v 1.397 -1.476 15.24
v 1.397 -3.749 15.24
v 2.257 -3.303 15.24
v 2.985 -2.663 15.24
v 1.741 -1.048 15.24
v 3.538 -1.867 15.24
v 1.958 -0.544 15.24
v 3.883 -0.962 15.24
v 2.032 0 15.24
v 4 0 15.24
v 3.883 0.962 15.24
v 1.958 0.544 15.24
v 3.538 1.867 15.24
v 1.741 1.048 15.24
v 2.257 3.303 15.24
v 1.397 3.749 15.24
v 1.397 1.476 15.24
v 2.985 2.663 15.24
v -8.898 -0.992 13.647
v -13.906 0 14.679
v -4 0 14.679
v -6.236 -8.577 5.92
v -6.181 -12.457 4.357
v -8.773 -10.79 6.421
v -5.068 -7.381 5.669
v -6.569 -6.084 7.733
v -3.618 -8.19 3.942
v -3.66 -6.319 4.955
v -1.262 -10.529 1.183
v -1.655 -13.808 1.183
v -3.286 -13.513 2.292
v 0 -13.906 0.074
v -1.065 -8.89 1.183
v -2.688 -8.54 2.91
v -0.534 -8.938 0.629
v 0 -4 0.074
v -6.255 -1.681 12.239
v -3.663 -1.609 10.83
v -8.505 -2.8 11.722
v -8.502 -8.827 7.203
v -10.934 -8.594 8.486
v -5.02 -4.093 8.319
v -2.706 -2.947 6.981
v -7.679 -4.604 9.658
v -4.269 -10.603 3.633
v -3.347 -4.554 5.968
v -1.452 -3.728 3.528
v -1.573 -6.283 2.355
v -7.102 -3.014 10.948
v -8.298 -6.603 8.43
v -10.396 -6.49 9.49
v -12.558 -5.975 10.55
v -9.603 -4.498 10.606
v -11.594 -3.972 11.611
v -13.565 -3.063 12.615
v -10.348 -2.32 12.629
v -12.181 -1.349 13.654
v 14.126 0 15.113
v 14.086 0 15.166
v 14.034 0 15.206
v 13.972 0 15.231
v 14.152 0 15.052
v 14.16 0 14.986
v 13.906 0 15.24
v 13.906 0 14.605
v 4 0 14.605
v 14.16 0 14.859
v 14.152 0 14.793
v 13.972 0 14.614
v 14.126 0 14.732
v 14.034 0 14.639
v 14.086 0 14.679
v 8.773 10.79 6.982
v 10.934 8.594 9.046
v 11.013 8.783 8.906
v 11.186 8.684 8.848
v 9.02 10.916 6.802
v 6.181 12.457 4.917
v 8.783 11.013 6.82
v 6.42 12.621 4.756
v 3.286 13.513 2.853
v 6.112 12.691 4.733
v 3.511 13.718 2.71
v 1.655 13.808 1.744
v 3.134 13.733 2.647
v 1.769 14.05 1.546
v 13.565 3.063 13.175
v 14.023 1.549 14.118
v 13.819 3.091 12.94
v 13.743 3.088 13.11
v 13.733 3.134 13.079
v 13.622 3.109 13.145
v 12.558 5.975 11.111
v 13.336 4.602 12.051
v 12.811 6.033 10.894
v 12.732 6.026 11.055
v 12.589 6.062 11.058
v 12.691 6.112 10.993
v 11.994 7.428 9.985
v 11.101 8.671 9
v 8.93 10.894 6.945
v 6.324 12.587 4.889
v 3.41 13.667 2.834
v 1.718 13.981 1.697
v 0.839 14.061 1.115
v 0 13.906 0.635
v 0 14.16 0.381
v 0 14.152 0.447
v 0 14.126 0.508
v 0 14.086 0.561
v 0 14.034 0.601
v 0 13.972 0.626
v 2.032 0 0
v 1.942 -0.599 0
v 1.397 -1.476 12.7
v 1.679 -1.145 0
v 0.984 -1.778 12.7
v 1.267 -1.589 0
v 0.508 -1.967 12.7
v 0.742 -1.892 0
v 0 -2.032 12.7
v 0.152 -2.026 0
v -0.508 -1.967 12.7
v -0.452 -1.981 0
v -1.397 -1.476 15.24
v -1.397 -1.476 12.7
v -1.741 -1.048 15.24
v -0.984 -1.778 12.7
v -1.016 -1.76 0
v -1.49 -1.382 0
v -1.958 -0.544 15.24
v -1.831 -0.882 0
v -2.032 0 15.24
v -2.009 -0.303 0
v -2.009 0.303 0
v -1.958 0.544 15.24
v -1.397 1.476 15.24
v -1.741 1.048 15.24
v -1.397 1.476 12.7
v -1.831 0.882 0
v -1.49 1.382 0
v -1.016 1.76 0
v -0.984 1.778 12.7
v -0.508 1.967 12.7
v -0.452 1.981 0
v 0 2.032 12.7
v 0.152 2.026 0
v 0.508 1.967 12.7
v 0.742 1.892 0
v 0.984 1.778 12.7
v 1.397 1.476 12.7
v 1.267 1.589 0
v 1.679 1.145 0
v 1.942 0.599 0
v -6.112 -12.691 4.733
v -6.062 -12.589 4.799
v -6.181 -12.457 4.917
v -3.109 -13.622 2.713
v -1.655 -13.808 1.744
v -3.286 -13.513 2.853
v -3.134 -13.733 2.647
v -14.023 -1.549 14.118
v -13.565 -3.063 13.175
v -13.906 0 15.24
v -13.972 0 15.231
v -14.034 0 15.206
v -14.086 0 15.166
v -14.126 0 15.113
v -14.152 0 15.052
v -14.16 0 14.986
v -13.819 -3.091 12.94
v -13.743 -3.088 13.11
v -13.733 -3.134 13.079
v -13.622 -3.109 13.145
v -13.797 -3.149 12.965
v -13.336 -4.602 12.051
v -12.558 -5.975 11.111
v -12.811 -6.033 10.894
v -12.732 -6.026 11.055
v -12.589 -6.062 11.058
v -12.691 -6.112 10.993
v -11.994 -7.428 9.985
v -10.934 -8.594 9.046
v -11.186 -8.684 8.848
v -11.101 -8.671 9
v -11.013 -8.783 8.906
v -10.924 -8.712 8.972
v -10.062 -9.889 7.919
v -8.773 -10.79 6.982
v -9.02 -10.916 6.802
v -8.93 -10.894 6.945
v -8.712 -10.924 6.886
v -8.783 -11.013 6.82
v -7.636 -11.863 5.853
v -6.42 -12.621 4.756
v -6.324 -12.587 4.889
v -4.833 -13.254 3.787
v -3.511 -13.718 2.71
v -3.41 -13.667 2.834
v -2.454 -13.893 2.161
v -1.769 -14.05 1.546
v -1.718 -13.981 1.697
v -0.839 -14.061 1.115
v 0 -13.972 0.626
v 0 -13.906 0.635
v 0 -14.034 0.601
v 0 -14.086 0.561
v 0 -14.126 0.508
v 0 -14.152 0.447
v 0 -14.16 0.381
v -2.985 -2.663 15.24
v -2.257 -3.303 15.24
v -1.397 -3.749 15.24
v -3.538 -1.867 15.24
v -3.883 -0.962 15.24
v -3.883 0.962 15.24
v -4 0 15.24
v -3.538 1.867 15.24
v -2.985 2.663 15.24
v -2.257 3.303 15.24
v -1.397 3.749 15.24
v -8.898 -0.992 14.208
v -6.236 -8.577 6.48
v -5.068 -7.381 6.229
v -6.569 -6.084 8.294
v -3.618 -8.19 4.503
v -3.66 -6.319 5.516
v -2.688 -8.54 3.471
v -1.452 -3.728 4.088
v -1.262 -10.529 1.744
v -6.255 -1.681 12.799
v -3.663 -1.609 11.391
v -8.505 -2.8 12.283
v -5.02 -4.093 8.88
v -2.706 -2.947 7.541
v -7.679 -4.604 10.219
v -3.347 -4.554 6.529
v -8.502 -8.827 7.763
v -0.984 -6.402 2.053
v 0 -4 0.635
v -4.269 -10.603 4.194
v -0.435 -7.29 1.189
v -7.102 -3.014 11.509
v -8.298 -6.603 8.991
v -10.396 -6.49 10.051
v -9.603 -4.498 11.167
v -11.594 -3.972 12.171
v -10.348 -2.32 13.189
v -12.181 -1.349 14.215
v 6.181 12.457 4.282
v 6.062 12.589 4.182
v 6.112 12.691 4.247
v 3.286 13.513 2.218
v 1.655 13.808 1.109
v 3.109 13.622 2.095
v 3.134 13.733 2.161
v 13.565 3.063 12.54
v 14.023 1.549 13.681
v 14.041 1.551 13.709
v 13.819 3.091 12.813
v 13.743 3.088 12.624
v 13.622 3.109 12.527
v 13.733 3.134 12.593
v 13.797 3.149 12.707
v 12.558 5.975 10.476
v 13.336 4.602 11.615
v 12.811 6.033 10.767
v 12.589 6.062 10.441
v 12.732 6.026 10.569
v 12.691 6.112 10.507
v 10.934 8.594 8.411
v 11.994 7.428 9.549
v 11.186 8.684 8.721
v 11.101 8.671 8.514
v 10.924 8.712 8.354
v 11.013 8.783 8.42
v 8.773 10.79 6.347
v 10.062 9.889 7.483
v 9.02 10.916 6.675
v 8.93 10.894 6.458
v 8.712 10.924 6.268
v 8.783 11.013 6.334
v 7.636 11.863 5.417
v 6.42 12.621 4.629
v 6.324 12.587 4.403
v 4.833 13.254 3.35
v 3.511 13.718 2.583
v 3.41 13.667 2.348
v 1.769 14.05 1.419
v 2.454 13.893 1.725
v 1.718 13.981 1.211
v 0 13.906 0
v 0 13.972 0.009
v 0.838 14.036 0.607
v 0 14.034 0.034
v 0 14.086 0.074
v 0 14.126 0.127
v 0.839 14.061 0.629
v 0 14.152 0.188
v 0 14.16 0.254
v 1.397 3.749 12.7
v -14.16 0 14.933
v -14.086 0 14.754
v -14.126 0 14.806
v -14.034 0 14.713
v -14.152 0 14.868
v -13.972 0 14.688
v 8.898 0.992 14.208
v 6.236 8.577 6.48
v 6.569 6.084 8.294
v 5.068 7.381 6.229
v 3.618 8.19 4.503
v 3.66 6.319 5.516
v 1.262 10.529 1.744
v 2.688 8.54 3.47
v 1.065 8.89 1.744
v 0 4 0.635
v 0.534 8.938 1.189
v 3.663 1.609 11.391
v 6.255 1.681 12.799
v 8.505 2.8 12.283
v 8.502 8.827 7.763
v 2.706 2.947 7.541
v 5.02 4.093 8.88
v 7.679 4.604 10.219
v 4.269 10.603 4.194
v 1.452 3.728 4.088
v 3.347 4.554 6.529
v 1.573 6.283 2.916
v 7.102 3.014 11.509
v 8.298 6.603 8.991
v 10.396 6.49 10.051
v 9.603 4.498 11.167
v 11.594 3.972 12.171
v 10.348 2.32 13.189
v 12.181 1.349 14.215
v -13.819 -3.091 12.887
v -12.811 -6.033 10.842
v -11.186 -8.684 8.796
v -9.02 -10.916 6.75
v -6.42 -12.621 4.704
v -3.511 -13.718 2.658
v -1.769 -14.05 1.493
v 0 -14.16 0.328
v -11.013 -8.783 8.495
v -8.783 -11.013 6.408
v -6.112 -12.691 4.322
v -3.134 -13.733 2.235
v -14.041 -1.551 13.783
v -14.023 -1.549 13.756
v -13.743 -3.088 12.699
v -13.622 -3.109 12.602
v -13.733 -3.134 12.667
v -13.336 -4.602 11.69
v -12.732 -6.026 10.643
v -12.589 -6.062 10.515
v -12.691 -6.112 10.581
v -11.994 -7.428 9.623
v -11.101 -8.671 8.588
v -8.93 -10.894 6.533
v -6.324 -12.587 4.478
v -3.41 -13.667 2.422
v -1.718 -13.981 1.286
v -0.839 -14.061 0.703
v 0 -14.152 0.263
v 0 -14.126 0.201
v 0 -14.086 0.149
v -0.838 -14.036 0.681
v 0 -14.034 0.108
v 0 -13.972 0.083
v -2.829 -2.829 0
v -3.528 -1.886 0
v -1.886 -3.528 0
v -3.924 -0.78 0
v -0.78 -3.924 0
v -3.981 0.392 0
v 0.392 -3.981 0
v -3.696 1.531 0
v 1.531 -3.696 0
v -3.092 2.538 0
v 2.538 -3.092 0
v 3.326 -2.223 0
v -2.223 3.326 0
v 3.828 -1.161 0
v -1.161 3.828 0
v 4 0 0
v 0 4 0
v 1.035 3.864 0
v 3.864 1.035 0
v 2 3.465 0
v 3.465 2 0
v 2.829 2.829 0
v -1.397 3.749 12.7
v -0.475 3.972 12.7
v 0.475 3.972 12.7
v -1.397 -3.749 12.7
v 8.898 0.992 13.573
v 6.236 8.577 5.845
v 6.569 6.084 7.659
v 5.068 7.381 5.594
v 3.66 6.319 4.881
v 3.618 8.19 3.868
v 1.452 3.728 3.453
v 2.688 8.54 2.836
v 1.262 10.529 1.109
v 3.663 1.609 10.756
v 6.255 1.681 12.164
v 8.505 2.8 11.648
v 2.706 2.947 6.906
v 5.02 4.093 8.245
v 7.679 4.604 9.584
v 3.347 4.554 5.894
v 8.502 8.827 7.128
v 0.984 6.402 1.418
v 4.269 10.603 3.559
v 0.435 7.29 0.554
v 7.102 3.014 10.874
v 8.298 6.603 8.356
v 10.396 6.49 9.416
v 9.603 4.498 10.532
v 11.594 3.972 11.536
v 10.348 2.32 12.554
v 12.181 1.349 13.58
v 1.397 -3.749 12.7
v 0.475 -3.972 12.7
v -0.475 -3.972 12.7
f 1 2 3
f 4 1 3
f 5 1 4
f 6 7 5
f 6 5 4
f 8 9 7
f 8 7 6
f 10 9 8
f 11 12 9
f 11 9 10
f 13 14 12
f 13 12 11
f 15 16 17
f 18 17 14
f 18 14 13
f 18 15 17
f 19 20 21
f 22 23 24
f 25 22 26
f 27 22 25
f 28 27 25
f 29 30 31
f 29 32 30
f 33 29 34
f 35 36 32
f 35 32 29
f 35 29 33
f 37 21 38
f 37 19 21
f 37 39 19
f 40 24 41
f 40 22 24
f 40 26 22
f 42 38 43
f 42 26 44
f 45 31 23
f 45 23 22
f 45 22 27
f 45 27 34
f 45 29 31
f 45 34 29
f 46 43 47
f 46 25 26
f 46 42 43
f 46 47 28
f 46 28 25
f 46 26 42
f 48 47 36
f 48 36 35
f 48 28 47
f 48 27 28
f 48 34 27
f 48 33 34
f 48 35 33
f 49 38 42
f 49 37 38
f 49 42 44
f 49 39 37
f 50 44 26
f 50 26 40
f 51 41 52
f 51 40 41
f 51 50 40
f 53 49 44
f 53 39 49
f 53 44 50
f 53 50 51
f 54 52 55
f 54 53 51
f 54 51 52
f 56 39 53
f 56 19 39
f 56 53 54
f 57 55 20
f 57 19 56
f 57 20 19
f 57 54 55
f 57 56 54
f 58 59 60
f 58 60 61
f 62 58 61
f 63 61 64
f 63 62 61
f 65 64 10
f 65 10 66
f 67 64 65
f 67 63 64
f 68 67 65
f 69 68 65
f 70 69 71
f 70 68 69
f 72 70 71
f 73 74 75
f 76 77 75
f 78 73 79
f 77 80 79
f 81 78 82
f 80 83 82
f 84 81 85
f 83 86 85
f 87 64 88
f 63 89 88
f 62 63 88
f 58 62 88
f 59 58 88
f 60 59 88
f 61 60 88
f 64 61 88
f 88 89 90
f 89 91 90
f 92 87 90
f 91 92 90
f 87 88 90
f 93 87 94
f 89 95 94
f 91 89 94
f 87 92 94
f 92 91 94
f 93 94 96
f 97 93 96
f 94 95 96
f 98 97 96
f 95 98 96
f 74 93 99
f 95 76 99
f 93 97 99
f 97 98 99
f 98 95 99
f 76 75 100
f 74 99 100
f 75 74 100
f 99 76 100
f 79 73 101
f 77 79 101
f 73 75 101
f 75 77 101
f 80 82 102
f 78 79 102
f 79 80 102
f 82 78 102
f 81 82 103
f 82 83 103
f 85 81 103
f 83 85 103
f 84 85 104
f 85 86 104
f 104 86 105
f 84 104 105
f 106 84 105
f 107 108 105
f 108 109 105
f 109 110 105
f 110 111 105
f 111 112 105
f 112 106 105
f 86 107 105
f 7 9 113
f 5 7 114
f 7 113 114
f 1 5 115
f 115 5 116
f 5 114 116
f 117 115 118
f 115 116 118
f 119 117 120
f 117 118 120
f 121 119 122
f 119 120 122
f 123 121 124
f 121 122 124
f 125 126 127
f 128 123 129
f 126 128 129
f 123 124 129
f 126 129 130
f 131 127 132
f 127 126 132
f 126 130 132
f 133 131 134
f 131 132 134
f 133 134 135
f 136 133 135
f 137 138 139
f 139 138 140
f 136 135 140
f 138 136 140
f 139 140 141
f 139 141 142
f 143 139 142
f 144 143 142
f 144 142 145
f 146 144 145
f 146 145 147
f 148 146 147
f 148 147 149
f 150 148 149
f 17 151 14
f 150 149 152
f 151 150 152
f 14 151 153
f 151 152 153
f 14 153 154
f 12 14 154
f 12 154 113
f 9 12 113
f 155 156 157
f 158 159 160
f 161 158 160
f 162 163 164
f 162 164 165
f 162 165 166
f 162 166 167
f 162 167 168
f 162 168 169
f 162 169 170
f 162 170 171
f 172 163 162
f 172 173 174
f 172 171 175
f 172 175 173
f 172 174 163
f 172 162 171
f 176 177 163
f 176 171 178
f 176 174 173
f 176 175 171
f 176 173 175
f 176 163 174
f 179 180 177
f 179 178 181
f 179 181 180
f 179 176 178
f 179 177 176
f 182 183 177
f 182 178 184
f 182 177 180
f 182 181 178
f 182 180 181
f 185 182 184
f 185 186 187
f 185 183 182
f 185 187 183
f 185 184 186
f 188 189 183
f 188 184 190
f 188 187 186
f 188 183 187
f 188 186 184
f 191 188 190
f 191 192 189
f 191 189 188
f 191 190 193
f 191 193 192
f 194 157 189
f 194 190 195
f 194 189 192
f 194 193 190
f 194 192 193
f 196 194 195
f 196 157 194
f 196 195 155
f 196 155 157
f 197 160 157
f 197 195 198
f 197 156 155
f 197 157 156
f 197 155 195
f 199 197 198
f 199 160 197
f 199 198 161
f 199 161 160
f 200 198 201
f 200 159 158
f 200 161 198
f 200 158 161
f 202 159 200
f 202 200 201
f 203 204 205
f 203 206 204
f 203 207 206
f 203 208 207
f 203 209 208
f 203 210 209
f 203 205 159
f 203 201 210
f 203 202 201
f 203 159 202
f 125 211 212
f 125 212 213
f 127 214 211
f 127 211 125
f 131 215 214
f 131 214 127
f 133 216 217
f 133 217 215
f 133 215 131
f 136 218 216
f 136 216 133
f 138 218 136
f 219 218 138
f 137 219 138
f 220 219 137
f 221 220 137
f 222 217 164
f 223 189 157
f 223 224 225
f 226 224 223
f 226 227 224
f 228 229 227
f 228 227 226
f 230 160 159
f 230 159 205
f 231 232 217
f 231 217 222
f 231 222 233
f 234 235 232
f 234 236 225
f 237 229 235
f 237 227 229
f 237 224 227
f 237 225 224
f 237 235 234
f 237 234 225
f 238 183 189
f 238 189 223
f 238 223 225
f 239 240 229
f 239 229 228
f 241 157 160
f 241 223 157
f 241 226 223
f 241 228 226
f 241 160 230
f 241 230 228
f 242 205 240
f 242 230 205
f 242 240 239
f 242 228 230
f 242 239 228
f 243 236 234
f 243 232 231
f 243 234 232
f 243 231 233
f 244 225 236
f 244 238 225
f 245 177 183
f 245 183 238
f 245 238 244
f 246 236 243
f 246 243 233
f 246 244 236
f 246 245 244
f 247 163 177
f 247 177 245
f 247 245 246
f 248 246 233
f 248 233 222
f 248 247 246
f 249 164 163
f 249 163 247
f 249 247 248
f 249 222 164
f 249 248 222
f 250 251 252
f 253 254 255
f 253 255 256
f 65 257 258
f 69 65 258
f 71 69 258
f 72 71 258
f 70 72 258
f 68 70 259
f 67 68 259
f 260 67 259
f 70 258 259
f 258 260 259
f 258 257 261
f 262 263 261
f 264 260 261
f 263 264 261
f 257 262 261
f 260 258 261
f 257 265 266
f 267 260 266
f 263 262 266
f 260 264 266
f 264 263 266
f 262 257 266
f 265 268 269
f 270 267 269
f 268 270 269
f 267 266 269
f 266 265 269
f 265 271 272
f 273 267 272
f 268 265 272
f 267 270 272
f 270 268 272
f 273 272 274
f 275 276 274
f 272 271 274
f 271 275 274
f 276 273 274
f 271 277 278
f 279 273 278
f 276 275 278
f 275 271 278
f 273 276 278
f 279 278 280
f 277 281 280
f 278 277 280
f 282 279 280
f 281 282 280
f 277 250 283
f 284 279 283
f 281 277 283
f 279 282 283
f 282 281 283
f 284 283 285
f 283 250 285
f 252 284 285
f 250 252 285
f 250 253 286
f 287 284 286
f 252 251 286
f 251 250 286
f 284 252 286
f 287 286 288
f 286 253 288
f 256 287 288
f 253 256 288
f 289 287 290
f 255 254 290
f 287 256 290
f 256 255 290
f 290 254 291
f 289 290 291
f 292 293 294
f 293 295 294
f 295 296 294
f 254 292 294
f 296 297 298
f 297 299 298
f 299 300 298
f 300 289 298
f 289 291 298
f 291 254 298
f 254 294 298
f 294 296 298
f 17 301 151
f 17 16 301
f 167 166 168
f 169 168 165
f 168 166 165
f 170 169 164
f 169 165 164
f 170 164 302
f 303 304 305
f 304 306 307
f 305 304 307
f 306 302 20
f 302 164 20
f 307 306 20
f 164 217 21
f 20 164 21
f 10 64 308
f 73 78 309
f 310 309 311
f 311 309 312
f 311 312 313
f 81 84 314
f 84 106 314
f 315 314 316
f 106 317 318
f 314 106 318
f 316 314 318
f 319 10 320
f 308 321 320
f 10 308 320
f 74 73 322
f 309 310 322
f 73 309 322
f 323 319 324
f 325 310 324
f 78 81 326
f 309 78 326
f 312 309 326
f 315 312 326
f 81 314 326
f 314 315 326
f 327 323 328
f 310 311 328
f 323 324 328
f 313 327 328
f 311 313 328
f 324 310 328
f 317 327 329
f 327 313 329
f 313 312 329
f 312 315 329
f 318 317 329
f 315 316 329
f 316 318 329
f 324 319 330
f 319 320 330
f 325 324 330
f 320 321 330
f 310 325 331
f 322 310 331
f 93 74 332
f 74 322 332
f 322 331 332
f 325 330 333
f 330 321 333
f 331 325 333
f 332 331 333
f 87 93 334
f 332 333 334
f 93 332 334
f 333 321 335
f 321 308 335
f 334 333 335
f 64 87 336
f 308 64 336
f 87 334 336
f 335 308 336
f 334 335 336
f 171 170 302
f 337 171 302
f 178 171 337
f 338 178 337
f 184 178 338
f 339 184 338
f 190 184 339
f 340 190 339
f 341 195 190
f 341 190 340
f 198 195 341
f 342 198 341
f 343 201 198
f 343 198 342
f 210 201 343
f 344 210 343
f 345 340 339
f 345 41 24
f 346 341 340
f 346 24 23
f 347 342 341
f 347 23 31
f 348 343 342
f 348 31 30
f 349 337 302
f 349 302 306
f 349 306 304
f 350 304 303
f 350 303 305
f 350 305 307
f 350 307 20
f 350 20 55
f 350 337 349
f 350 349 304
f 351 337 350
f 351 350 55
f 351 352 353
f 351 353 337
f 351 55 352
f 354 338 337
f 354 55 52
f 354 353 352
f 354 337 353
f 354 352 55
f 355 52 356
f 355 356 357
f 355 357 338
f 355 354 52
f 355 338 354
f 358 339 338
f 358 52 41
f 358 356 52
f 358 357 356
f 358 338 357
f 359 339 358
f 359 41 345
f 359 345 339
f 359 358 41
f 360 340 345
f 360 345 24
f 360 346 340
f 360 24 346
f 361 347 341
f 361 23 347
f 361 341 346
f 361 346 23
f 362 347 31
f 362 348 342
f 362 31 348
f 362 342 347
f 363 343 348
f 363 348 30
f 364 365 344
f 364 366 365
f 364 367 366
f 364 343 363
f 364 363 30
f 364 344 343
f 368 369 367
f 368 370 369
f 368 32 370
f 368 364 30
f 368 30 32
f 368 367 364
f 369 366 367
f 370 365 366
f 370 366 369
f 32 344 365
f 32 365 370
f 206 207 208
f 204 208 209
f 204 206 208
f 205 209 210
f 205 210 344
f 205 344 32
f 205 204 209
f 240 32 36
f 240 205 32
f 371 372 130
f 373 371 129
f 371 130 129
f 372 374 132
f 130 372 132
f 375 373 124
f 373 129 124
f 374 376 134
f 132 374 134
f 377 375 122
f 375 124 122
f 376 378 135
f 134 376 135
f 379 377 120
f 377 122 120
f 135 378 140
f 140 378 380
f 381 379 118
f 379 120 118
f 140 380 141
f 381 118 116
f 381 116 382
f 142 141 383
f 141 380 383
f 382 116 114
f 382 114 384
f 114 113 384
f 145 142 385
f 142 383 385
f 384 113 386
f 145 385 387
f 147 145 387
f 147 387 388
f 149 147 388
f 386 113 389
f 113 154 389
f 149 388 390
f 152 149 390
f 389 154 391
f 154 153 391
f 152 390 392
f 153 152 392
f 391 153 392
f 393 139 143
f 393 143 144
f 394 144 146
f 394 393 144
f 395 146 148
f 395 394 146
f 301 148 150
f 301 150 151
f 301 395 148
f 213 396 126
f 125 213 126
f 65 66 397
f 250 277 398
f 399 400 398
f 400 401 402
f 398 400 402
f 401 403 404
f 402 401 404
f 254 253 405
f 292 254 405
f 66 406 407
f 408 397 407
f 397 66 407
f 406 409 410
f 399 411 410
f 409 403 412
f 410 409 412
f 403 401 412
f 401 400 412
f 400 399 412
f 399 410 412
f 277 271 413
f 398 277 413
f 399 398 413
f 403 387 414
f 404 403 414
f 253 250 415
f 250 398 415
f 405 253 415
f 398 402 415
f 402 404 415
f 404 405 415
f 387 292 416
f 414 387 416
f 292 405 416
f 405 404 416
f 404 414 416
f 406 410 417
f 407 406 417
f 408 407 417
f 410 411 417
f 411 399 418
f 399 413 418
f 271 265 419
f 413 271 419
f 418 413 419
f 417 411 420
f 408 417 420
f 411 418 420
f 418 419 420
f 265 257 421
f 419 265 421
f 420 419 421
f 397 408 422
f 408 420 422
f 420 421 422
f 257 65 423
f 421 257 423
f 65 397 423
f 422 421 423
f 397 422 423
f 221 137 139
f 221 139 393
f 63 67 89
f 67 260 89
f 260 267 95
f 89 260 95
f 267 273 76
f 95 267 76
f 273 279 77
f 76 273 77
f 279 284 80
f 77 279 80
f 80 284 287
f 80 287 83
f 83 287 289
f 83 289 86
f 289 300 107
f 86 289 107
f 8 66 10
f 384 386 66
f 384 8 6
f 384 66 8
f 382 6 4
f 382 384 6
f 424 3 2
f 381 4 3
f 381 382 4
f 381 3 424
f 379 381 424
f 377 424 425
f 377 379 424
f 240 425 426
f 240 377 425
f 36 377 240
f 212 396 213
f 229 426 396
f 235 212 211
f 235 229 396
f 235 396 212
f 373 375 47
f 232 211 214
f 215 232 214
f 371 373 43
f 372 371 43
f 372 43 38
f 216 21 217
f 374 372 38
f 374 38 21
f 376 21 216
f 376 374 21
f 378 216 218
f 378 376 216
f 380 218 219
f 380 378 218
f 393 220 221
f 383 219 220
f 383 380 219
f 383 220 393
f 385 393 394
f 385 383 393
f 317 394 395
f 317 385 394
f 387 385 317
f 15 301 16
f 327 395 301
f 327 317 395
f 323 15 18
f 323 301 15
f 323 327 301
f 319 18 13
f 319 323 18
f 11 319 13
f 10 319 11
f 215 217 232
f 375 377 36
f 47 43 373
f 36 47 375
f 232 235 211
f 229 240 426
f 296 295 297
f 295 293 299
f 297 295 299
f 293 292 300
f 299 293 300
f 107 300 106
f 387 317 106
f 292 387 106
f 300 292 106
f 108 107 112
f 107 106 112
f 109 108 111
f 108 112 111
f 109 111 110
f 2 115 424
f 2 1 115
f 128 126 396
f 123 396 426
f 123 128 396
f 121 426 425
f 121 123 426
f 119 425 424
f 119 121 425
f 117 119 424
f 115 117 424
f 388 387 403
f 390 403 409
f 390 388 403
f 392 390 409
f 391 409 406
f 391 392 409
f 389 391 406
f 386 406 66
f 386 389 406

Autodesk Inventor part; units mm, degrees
ref_plane "YZ Plane" through (0, 0, 0) normal (1, 0, 0) x (0, 1, 0)
ref_plane "XZ Plane" through (0, 0, 0) normal (0, 1, 0) x (-1, 0, 0)
sketch "Sketch1" plane through (0, 0, 0) normal (0, 0, 1) x (1, 0, 0)
  circle A0 centre (0, 0) radius 4.0005
  circle A1 centre (0, 0) radius 2.032
  dimension "d0" = 8.001
  dimension "d2" = 4.064
extrude "Extrusion1" add sketch "Sketch1" along normal blind 15.24
sketch "Sketch2" plane through (0, 0, 15.24) normal (0, 0, 1) x (1, 0, 0)
  circle A0 centre (0, 0) radius 2.032 projected
  line L0 (-1.397, 5.1605) -> (1.397, 5.1605)
  line L1 (1.397, 5.1605) -> (1.397, -5.4473)
  line L2 (1.397, -5.4473) -> (-1.397, -5.4473)
  line L3 (-1.397, -5.4473) -> (-1.397, 5.1605)
  point P0 (2.032, 5.1605)
  dimension "d5" = 1.397
  dimension "d6" = 1.397
extrude "Extrusion2" cut sketch "Sketch2" against normal blind 2.54 contours L1 A0 L3 | A0 L3 L0 L1 | L1 L2 L3 A0
ref_plane "Work Plane1" through (0, 0, 0) normal (0, -1, 0) x (0, 0, -1)
sketch "Sketch3" plane through (0, 0, 0) normal (0, -1, 0) x (0, 0, -1)
  line L0 (-15.24, 4.0005) -> (-15.24, 1.397) projected
  line L1 (-15.24, 4.0005) -> (-14.605, 4.0005)
  line L2 (-14.605, 4.0005) -> (-14.605, 13.9065)
  line L3 (-14.859, 14.1605) -> (-14.986, 14.1605)
  line L4 (-15.24, 13.9065) -> (-15.24, 4.0005)
  arc A0 (-14.986, 14.1605) -> (-15.24, 13.9065) centre (-14.986, 13.9065) ccw
  arc A1 (-14.605, 13.9065) -> (-14.859, 14.1605) centre (-14.859, 13.9065) ccw
  line L5 (-15.24, -4.0005) -> (-14.6794, -4.0005)
  line L6 (-14.6794, -4.0005) -> (-14.6794, -13.9065)
  line L7 (-14.9334, -14.1605) -> (-14.986, -14.1605)
  line L8 (-15.24, -13.9065) -> (-15.24, -4.0005)
  arc A2 (-15.24, -13.9065) -> (-14.986, -14.1605) centre (-14.986, -13.9065) ccw
  arc A3 (-14.9334, -14.1605) -> (-14.6794, -13.9065) centre (-14.9334, -13.9065) ccw
  point P0 (0, 0)
  point P1 (1.7022, 0)
  dimension "d10" = 4.0005
  dimension "d12" = 0.635
  dimension "d13" = 10.16
  dimension "d14" = 0.254
  dimension "d15" = 8.001
  dimension "d16" = 8.001
  dimension "d17" = 10.16
  dimension "d18" = 0.254
ref_plane "Work Plane2" through (0, 0, 0) normal (-1, 0, 0) x (0, 0, -1)
sketch "Sketch4" plane through (0, 0, 0) normal (-1, 0, 0) x (0, 0, -1)
  line L0 (0, -4.0005) -> (0, 4.0005) projected
  line L1 (-1.9812, -4.0005) -> (-0.0316, -19.5002)
  line L2 (-2.54, -4.0005) -> (-0.5277, -19.5635)
  line L3 (-1.9812, -4.0005) -> (-2.54, -4.0005)
  line L4 (-0.2432, -19.7828) -> (-0.251, -19.7838)
  arc A0 (-0.5277, -19.5635) -> (-0.2432, -19.7828) centre (-0.2757, -19.5309) ccw
  arc A1 (-0.251, -19.7838) -> (-0.0316, -19.5002) centre (-0.2836, -19.5319) ccw
  line L5 (-1.9812, 4.0005) -> (-0.0317, 19.4994)
  line L6 (-2.54, 4.0005) -> (-0.5818, 19.5686)
  line L7 (-0.2981, 19.7889) -> (-0.252, 19.7831)
  arc A2 (-0.0317, 19.4994) -> (-0.252, 19.7831) centre (-0.2837, 19.5311) ccw
  arc A3 (-0.2981, 19.7889) -> (-0.5818, 19.5686) centre (-0.3298, 19.5369) ccw
  line L8 (-2.54, 4.0005) -> (-1.9812, 4.0005)
  point P0 (0, 0)
  point P1 (0.7046, 0)
  point P2 (0, -19.7514)
  point P3 (0, 19.7514)
  dimension "d25" = 15.875
  dimension "d26" = 0
  dimension "d27" = 1.9812
  dimension "d28" = 0.254
  dimension "d29" = 15.875
  dimension "d30" = 0
  dimension "d31" = 1.9812
  dimension "d32" = 0.254
coil "Coil1" sketch "Sketch3" operation add axis through (0, 0, 0) along (0, 0, -1) pitch 58.42 turns 0.25 hand left contours L4 A0 L3 A1 L2 L1
coil "Coil2" sketch "Sketch3" operation add axis through (0, 0, 0) along (0, 0, -1) pitch 58.42 turns 0.25 hand left contours L5 L6 A3 L7 A2 L8
properties part number "Main Prop" material "ABS Plastic"
